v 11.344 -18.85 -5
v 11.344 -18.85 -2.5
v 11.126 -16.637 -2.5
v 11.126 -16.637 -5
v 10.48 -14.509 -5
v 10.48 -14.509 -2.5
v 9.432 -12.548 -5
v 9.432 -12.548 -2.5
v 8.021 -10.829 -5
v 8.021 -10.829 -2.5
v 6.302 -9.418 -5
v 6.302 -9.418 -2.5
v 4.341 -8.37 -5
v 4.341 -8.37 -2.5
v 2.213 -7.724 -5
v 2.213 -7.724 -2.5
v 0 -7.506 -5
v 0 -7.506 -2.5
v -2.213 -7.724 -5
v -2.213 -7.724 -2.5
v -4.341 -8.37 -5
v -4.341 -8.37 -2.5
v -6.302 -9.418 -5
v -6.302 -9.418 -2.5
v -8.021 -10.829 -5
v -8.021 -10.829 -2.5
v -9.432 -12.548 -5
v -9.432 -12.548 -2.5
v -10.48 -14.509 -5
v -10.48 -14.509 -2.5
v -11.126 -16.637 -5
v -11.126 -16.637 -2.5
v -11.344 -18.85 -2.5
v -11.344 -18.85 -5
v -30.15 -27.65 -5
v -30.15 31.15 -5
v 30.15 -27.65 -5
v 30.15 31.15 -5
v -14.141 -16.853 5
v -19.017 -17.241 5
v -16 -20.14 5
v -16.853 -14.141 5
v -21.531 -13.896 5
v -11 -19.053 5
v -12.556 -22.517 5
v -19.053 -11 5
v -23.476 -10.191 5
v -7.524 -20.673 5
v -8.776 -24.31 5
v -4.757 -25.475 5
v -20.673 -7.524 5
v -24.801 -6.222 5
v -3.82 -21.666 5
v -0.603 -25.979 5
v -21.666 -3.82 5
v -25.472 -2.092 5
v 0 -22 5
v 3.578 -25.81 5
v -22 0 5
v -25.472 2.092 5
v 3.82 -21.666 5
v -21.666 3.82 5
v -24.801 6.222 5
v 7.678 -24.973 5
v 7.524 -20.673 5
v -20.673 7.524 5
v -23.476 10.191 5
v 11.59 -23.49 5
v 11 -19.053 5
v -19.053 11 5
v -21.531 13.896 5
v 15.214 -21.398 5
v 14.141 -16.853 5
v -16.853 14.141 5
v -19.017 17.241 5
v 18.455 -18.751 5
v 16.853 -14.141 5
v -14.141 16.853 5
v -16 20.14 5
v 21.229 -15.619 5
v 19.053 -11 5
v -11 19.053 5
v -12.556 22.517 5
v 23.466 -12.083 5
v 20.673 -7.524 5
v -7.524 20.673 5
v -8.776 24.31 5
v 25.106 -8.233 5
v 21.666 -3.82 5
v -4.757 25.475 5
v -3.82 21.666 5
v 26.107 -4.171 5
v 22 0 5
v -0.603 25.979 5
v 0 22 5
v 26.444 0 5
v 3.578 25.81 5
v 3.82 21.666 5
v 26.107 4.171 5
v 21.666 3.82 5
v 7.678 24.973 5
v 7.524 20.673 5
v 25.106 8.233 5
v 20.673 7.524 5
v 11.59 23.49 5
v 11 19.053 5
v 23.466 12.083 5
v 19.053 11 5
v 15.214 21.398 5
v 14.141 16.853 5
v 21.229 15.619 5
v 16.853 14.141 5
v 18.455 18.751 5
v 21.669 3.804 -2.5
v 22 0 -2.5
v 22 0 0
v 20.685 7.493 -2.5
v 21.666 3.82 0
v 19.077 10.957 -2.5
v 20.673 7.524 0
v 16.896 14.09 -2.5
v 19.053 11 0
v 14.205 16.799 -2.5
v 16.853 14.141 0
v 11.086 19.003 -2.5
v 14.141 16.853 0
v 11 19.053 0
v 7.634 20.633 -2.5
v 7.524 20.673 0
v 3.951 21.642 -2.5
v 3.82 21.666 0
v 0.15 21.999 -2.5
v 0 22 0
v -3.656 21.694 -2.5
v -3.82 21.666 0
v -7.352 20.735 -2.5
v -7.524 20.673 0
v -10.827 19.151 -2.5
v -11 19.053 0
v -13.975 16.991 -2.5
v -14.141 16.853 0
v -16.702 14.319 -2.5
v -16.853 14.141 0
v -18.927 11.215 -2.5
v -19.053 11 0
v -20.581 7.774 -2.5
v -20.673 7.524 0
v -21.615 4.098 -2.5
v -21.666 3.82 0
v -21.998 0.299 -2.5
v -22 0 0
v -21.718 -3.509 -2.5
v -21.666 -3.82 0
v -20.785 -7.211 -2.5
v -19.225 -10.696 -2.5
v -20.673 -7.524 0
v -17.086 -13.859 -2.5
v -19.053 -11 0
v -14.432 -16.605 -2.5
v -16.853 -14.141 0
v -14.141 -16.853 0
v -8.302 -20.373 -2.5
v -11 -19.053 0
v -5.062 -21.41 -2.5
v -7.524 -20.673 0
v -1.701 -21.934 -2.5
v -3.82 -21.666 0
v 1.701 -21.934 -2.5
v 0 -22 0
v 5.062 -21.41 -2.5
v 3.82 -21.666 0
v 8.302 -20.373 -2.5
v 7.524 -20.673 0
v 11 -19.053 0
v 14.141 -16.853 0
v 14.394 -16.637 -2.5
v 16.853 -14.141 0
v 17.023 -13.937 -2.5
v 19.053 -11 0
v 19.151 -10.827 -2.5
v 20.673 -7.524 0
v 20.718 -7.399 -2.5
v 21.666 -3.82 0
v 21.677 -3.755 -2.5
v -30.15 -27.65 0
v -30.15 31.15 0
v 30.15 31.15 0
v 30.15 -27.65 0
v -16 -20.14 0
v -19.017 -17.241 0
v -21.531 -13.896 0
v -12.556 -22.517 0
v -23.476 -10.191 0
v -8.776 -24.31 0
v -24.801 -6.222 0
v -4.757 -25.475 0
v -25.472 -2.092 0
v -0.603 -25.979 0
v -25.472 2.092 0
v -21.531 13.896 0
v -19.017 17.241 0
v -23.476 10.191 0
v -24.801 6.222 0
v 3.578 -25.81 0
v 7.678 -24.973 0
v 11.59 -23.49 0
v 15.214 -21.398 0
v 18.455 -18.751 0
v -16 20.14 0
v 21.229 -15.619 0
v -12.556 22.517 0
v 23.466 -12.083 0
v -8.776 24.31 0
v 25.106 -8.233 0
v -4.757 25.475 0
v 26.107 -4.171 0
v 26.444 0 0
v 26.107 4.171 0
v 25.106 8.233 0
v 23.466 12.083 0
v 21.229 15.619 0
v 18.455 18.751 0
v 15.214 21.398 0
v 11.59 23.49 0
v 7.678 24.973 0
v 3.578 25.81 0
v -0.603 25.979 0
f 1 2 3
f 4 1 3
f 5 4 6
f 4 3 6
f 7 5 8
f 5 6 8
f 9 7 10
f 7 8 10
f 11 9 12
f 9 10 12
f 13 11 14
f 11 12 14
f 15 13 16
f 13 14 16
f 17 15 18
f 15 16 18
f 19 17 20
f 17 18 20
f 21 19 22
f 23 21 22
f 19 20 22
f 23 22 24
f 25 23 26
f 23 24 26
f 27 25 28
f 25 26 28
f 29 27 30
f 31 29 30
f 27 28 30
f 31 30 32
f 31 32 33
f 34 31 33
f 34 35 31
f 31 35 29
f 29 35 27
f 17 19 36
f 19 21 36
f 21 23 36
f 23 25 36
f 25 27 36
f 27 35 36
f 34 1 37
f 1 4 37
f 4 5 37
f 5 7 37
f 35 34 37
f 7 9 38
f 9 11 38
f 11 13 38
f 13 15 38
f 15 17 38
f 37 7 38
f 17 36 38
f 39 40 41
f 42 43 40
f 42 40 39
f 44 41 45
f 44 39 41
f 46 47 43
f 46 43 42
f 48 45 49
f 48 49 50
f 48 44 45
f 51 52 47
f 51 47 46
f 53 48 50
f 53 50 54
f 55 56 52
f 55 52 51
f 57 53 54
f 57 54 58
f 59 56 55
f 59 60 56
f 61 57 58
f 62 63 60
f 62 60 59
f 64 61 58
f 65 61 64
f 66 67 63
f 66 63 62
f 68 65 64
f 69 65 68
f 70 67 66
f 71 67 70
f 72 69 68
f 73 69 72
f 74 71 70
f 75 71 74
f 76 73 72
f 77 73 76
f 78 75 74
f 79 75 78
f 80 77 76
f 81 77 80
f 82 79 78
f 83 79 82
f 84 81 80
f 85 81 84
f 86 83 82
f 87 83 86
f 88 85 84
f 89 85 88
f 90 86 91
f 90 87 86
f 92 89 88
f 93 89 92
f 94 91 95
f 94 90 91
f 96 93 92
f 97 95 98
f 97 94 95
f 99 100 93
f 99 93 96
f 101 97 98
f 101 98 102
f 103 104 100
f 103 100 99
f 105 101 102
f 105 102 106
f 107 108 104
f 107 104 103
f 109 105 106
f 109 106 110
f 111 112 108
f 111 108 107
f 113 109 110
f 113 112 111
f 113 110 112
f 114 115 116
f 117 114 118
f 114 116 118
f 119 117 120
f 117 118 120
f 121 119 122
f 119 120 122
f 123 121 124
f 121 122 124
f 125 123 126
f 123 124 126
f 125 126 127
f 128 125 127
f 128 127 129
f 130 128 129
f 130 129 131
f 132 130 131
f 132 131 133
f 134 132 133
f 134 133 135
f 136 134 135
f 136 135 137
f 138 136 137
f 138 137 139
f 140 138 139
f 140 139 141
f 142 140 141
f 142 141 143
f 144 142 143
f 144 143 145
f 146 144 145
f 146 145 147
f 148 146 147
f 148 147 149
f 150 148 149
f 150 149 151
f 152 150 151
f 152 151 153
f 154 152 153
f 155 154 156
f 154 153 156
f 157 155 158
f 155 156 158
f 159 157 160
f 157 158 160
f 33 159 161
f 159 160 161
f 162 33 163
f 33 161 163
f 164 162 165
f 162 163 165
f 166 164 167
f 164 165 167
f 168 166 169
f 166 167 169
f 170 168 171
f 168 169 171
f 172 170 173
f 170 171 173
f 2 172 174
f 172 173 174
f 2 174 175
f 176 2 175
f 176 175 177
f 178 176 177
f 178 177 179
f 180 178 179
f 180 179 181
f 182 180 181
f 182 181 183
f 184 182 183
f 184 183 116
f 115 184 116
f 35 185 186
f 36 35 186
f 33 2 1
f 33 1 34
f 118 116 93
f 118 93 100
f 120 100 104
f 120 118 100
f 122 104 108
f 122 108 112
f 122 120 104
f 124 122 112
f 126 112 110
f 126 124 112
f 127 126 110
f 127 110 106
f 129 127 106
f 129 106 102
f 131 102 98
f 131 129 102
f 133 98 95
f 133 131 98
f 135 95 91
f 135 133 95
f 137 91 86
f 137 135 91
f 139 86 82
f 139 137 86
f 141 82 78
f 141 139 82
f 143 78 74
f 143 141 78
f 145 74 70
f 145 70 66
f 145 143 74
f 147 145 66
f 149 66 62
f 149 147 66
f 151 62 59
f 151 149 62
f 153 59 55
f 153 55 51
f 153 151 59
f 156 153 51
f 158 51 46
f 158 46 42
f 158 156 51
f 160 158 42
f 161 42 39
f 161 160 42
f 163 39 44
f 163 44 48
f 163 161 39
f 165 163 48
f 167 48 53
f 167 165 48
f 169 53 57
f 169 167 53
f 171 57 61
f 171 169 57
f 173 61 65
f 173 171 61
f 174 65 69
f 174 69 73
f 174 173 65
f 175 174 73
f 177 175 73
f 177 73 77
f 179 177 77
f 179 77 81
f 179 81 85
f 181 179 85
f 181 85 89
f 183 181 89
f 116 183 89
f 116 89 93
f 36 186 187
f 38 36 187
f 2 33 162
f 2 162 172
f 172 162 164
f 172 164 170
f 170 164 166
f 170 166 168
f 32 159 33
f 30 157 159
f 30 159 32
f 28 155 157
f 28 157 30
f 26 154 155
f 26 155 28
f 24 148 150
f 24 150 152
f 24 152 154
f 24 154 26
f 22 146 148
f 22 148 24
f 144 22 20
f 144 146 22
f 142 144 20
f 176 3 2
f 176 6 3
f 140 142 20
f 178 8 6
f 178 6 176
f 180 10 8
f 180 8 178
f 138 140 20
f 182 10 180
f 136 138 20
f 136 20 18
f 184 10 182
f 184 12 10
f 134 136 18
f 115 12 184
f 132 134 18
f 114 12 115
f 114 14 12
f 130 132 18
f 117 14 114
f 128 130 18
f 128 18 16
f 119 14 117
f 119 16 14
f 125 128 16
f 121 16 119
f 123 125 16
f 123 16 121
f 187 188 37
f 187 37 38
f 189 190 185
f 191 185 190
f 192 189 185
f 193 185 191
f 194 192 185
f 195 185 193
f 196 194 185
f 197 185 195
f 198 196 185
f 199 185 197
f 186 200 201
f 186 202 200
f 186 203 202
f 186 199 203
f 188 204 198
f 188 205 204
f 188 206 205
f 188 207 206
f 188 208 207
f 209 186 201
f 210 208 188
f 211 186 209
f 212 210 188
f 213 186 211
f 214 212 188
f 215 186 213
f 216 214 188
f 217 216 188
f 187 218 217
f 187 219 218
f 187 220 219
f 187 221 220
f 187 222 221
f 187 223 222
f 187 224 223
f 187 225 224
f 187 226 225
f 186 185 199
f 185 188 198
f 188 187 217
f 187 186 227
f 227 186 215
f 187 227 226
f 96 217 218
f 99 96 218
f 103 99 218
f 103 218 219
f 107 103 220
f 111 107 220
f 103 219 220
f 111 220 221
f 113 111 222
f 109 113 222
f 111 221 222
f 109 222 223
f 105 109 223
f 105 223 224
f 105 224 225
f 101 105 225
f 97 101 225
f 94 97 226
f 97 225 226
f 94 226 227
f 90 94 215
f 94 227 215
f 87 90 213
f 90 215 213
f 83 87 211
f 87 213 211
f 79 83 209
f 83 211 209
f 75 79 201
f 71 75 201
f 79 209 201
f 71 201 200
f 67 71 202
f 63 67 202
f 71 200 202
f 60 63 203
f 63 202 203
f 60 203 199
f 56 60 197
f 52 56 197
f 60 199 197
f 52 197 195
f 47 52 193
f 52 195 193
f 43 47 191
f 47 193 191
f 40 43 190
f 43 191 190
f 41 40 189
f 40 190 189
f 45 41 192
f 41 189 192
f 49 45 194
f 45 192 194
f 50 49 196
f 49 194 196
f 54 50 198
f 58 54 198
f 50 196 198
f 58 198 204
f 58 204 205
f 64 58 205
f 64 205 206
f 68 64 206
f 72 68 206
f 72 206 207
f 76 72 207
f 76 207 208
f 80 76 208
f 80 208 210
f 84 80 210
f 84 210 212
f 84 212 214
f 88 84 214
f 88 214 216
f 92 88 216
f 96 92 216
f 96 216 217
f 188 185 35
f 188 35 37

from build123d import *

# Parameters (mm, degrees)
SKETCH16_W          = 60.3
SKETCH16_H          = 58.8
SKETCH16_R          = 22
BOSS_EXTRUDE2_DEPTH = 5
SKETCH22_W          = 60.3
SKETCH22_H          = 2.5
BOSS_EXTRUDE7_DEPTH = 50
SKETCH23_R          = 26
SKETCH23_R_2        = 22
BOSS_EXTRUDE8_DEPTH = 5
CUT_EXTRUDE3_DEPTH  = 2.5
BOSS_EXTRUDE9_DEPTH = 2.5


with BuildPart() as part:
    # Sketch16 → Boss-Extrude2 (new body)
    with BuildSketch(Plane.XY):
        with Locations((0, 1.75)):
            Rectangle(SKETCH16_W, SKETCH16_H)
        Circle(SKETCH16_R, mode=Mode.SUBTRACT)
    extrude(amount=-BOSS_EXTRUDE2_DEPTH)

    # Sketch22 → Boss-Extrude7 (add)
    with BuildSketch(Plane(origin=(0, 31.15, 0), x_dir=(1, 0, 0), z_dir=(0, 1, 0))):
        with Locations((0, 3.75)):
            Rectangle(SKETCH22_W, SKETCH22_H)
    extrude(amount=-BOSS_EXTRUDE7_DEPTH)

    # Sketch23 → Boss-Extrude8 (add)
    with BuildSketch(Plane.XY):
        with Locations((0.443922204, 0)):
            Circle(SKETCH23_R)
        Circle(SKETCH23_R_2, mode=Mode.SUBTRACT)
    extrude(amount=BOSS_EXTRUDE8_DEPTH)

    # Sketch24 → Cut-Extrude3 (cut)
    with BuildSketch(Plane.XY.offset(-2.5)):
        with BuildLine():
            Line((-11.343610536, -18.85), (11.343610536, -18.85))
            ThreePointArc((11.343610536, -18.85), (0, -7.506389464), (-11.343610536, -18.85))
        make_face()
    extrude(amount=-CUT_EXTRUDE3_DEPTH, mode=Mode.SUBTRACT)

    # Sketch25 → Boss-Extrude9 (add)
    with BuildSketch(Plane.XY.offset(-2.5)):
        with BuildLine():
            Line((11.343610536, -18.85), (-11.343610536, -18.85))
            ThreePointArc((-11.343610536, -18.85), (0, -22), (11.343610536, -18.85))
        make_face()
    extrude(amount=-BOSS_EXTRUDE9_DEPTH)


solid = part.part
